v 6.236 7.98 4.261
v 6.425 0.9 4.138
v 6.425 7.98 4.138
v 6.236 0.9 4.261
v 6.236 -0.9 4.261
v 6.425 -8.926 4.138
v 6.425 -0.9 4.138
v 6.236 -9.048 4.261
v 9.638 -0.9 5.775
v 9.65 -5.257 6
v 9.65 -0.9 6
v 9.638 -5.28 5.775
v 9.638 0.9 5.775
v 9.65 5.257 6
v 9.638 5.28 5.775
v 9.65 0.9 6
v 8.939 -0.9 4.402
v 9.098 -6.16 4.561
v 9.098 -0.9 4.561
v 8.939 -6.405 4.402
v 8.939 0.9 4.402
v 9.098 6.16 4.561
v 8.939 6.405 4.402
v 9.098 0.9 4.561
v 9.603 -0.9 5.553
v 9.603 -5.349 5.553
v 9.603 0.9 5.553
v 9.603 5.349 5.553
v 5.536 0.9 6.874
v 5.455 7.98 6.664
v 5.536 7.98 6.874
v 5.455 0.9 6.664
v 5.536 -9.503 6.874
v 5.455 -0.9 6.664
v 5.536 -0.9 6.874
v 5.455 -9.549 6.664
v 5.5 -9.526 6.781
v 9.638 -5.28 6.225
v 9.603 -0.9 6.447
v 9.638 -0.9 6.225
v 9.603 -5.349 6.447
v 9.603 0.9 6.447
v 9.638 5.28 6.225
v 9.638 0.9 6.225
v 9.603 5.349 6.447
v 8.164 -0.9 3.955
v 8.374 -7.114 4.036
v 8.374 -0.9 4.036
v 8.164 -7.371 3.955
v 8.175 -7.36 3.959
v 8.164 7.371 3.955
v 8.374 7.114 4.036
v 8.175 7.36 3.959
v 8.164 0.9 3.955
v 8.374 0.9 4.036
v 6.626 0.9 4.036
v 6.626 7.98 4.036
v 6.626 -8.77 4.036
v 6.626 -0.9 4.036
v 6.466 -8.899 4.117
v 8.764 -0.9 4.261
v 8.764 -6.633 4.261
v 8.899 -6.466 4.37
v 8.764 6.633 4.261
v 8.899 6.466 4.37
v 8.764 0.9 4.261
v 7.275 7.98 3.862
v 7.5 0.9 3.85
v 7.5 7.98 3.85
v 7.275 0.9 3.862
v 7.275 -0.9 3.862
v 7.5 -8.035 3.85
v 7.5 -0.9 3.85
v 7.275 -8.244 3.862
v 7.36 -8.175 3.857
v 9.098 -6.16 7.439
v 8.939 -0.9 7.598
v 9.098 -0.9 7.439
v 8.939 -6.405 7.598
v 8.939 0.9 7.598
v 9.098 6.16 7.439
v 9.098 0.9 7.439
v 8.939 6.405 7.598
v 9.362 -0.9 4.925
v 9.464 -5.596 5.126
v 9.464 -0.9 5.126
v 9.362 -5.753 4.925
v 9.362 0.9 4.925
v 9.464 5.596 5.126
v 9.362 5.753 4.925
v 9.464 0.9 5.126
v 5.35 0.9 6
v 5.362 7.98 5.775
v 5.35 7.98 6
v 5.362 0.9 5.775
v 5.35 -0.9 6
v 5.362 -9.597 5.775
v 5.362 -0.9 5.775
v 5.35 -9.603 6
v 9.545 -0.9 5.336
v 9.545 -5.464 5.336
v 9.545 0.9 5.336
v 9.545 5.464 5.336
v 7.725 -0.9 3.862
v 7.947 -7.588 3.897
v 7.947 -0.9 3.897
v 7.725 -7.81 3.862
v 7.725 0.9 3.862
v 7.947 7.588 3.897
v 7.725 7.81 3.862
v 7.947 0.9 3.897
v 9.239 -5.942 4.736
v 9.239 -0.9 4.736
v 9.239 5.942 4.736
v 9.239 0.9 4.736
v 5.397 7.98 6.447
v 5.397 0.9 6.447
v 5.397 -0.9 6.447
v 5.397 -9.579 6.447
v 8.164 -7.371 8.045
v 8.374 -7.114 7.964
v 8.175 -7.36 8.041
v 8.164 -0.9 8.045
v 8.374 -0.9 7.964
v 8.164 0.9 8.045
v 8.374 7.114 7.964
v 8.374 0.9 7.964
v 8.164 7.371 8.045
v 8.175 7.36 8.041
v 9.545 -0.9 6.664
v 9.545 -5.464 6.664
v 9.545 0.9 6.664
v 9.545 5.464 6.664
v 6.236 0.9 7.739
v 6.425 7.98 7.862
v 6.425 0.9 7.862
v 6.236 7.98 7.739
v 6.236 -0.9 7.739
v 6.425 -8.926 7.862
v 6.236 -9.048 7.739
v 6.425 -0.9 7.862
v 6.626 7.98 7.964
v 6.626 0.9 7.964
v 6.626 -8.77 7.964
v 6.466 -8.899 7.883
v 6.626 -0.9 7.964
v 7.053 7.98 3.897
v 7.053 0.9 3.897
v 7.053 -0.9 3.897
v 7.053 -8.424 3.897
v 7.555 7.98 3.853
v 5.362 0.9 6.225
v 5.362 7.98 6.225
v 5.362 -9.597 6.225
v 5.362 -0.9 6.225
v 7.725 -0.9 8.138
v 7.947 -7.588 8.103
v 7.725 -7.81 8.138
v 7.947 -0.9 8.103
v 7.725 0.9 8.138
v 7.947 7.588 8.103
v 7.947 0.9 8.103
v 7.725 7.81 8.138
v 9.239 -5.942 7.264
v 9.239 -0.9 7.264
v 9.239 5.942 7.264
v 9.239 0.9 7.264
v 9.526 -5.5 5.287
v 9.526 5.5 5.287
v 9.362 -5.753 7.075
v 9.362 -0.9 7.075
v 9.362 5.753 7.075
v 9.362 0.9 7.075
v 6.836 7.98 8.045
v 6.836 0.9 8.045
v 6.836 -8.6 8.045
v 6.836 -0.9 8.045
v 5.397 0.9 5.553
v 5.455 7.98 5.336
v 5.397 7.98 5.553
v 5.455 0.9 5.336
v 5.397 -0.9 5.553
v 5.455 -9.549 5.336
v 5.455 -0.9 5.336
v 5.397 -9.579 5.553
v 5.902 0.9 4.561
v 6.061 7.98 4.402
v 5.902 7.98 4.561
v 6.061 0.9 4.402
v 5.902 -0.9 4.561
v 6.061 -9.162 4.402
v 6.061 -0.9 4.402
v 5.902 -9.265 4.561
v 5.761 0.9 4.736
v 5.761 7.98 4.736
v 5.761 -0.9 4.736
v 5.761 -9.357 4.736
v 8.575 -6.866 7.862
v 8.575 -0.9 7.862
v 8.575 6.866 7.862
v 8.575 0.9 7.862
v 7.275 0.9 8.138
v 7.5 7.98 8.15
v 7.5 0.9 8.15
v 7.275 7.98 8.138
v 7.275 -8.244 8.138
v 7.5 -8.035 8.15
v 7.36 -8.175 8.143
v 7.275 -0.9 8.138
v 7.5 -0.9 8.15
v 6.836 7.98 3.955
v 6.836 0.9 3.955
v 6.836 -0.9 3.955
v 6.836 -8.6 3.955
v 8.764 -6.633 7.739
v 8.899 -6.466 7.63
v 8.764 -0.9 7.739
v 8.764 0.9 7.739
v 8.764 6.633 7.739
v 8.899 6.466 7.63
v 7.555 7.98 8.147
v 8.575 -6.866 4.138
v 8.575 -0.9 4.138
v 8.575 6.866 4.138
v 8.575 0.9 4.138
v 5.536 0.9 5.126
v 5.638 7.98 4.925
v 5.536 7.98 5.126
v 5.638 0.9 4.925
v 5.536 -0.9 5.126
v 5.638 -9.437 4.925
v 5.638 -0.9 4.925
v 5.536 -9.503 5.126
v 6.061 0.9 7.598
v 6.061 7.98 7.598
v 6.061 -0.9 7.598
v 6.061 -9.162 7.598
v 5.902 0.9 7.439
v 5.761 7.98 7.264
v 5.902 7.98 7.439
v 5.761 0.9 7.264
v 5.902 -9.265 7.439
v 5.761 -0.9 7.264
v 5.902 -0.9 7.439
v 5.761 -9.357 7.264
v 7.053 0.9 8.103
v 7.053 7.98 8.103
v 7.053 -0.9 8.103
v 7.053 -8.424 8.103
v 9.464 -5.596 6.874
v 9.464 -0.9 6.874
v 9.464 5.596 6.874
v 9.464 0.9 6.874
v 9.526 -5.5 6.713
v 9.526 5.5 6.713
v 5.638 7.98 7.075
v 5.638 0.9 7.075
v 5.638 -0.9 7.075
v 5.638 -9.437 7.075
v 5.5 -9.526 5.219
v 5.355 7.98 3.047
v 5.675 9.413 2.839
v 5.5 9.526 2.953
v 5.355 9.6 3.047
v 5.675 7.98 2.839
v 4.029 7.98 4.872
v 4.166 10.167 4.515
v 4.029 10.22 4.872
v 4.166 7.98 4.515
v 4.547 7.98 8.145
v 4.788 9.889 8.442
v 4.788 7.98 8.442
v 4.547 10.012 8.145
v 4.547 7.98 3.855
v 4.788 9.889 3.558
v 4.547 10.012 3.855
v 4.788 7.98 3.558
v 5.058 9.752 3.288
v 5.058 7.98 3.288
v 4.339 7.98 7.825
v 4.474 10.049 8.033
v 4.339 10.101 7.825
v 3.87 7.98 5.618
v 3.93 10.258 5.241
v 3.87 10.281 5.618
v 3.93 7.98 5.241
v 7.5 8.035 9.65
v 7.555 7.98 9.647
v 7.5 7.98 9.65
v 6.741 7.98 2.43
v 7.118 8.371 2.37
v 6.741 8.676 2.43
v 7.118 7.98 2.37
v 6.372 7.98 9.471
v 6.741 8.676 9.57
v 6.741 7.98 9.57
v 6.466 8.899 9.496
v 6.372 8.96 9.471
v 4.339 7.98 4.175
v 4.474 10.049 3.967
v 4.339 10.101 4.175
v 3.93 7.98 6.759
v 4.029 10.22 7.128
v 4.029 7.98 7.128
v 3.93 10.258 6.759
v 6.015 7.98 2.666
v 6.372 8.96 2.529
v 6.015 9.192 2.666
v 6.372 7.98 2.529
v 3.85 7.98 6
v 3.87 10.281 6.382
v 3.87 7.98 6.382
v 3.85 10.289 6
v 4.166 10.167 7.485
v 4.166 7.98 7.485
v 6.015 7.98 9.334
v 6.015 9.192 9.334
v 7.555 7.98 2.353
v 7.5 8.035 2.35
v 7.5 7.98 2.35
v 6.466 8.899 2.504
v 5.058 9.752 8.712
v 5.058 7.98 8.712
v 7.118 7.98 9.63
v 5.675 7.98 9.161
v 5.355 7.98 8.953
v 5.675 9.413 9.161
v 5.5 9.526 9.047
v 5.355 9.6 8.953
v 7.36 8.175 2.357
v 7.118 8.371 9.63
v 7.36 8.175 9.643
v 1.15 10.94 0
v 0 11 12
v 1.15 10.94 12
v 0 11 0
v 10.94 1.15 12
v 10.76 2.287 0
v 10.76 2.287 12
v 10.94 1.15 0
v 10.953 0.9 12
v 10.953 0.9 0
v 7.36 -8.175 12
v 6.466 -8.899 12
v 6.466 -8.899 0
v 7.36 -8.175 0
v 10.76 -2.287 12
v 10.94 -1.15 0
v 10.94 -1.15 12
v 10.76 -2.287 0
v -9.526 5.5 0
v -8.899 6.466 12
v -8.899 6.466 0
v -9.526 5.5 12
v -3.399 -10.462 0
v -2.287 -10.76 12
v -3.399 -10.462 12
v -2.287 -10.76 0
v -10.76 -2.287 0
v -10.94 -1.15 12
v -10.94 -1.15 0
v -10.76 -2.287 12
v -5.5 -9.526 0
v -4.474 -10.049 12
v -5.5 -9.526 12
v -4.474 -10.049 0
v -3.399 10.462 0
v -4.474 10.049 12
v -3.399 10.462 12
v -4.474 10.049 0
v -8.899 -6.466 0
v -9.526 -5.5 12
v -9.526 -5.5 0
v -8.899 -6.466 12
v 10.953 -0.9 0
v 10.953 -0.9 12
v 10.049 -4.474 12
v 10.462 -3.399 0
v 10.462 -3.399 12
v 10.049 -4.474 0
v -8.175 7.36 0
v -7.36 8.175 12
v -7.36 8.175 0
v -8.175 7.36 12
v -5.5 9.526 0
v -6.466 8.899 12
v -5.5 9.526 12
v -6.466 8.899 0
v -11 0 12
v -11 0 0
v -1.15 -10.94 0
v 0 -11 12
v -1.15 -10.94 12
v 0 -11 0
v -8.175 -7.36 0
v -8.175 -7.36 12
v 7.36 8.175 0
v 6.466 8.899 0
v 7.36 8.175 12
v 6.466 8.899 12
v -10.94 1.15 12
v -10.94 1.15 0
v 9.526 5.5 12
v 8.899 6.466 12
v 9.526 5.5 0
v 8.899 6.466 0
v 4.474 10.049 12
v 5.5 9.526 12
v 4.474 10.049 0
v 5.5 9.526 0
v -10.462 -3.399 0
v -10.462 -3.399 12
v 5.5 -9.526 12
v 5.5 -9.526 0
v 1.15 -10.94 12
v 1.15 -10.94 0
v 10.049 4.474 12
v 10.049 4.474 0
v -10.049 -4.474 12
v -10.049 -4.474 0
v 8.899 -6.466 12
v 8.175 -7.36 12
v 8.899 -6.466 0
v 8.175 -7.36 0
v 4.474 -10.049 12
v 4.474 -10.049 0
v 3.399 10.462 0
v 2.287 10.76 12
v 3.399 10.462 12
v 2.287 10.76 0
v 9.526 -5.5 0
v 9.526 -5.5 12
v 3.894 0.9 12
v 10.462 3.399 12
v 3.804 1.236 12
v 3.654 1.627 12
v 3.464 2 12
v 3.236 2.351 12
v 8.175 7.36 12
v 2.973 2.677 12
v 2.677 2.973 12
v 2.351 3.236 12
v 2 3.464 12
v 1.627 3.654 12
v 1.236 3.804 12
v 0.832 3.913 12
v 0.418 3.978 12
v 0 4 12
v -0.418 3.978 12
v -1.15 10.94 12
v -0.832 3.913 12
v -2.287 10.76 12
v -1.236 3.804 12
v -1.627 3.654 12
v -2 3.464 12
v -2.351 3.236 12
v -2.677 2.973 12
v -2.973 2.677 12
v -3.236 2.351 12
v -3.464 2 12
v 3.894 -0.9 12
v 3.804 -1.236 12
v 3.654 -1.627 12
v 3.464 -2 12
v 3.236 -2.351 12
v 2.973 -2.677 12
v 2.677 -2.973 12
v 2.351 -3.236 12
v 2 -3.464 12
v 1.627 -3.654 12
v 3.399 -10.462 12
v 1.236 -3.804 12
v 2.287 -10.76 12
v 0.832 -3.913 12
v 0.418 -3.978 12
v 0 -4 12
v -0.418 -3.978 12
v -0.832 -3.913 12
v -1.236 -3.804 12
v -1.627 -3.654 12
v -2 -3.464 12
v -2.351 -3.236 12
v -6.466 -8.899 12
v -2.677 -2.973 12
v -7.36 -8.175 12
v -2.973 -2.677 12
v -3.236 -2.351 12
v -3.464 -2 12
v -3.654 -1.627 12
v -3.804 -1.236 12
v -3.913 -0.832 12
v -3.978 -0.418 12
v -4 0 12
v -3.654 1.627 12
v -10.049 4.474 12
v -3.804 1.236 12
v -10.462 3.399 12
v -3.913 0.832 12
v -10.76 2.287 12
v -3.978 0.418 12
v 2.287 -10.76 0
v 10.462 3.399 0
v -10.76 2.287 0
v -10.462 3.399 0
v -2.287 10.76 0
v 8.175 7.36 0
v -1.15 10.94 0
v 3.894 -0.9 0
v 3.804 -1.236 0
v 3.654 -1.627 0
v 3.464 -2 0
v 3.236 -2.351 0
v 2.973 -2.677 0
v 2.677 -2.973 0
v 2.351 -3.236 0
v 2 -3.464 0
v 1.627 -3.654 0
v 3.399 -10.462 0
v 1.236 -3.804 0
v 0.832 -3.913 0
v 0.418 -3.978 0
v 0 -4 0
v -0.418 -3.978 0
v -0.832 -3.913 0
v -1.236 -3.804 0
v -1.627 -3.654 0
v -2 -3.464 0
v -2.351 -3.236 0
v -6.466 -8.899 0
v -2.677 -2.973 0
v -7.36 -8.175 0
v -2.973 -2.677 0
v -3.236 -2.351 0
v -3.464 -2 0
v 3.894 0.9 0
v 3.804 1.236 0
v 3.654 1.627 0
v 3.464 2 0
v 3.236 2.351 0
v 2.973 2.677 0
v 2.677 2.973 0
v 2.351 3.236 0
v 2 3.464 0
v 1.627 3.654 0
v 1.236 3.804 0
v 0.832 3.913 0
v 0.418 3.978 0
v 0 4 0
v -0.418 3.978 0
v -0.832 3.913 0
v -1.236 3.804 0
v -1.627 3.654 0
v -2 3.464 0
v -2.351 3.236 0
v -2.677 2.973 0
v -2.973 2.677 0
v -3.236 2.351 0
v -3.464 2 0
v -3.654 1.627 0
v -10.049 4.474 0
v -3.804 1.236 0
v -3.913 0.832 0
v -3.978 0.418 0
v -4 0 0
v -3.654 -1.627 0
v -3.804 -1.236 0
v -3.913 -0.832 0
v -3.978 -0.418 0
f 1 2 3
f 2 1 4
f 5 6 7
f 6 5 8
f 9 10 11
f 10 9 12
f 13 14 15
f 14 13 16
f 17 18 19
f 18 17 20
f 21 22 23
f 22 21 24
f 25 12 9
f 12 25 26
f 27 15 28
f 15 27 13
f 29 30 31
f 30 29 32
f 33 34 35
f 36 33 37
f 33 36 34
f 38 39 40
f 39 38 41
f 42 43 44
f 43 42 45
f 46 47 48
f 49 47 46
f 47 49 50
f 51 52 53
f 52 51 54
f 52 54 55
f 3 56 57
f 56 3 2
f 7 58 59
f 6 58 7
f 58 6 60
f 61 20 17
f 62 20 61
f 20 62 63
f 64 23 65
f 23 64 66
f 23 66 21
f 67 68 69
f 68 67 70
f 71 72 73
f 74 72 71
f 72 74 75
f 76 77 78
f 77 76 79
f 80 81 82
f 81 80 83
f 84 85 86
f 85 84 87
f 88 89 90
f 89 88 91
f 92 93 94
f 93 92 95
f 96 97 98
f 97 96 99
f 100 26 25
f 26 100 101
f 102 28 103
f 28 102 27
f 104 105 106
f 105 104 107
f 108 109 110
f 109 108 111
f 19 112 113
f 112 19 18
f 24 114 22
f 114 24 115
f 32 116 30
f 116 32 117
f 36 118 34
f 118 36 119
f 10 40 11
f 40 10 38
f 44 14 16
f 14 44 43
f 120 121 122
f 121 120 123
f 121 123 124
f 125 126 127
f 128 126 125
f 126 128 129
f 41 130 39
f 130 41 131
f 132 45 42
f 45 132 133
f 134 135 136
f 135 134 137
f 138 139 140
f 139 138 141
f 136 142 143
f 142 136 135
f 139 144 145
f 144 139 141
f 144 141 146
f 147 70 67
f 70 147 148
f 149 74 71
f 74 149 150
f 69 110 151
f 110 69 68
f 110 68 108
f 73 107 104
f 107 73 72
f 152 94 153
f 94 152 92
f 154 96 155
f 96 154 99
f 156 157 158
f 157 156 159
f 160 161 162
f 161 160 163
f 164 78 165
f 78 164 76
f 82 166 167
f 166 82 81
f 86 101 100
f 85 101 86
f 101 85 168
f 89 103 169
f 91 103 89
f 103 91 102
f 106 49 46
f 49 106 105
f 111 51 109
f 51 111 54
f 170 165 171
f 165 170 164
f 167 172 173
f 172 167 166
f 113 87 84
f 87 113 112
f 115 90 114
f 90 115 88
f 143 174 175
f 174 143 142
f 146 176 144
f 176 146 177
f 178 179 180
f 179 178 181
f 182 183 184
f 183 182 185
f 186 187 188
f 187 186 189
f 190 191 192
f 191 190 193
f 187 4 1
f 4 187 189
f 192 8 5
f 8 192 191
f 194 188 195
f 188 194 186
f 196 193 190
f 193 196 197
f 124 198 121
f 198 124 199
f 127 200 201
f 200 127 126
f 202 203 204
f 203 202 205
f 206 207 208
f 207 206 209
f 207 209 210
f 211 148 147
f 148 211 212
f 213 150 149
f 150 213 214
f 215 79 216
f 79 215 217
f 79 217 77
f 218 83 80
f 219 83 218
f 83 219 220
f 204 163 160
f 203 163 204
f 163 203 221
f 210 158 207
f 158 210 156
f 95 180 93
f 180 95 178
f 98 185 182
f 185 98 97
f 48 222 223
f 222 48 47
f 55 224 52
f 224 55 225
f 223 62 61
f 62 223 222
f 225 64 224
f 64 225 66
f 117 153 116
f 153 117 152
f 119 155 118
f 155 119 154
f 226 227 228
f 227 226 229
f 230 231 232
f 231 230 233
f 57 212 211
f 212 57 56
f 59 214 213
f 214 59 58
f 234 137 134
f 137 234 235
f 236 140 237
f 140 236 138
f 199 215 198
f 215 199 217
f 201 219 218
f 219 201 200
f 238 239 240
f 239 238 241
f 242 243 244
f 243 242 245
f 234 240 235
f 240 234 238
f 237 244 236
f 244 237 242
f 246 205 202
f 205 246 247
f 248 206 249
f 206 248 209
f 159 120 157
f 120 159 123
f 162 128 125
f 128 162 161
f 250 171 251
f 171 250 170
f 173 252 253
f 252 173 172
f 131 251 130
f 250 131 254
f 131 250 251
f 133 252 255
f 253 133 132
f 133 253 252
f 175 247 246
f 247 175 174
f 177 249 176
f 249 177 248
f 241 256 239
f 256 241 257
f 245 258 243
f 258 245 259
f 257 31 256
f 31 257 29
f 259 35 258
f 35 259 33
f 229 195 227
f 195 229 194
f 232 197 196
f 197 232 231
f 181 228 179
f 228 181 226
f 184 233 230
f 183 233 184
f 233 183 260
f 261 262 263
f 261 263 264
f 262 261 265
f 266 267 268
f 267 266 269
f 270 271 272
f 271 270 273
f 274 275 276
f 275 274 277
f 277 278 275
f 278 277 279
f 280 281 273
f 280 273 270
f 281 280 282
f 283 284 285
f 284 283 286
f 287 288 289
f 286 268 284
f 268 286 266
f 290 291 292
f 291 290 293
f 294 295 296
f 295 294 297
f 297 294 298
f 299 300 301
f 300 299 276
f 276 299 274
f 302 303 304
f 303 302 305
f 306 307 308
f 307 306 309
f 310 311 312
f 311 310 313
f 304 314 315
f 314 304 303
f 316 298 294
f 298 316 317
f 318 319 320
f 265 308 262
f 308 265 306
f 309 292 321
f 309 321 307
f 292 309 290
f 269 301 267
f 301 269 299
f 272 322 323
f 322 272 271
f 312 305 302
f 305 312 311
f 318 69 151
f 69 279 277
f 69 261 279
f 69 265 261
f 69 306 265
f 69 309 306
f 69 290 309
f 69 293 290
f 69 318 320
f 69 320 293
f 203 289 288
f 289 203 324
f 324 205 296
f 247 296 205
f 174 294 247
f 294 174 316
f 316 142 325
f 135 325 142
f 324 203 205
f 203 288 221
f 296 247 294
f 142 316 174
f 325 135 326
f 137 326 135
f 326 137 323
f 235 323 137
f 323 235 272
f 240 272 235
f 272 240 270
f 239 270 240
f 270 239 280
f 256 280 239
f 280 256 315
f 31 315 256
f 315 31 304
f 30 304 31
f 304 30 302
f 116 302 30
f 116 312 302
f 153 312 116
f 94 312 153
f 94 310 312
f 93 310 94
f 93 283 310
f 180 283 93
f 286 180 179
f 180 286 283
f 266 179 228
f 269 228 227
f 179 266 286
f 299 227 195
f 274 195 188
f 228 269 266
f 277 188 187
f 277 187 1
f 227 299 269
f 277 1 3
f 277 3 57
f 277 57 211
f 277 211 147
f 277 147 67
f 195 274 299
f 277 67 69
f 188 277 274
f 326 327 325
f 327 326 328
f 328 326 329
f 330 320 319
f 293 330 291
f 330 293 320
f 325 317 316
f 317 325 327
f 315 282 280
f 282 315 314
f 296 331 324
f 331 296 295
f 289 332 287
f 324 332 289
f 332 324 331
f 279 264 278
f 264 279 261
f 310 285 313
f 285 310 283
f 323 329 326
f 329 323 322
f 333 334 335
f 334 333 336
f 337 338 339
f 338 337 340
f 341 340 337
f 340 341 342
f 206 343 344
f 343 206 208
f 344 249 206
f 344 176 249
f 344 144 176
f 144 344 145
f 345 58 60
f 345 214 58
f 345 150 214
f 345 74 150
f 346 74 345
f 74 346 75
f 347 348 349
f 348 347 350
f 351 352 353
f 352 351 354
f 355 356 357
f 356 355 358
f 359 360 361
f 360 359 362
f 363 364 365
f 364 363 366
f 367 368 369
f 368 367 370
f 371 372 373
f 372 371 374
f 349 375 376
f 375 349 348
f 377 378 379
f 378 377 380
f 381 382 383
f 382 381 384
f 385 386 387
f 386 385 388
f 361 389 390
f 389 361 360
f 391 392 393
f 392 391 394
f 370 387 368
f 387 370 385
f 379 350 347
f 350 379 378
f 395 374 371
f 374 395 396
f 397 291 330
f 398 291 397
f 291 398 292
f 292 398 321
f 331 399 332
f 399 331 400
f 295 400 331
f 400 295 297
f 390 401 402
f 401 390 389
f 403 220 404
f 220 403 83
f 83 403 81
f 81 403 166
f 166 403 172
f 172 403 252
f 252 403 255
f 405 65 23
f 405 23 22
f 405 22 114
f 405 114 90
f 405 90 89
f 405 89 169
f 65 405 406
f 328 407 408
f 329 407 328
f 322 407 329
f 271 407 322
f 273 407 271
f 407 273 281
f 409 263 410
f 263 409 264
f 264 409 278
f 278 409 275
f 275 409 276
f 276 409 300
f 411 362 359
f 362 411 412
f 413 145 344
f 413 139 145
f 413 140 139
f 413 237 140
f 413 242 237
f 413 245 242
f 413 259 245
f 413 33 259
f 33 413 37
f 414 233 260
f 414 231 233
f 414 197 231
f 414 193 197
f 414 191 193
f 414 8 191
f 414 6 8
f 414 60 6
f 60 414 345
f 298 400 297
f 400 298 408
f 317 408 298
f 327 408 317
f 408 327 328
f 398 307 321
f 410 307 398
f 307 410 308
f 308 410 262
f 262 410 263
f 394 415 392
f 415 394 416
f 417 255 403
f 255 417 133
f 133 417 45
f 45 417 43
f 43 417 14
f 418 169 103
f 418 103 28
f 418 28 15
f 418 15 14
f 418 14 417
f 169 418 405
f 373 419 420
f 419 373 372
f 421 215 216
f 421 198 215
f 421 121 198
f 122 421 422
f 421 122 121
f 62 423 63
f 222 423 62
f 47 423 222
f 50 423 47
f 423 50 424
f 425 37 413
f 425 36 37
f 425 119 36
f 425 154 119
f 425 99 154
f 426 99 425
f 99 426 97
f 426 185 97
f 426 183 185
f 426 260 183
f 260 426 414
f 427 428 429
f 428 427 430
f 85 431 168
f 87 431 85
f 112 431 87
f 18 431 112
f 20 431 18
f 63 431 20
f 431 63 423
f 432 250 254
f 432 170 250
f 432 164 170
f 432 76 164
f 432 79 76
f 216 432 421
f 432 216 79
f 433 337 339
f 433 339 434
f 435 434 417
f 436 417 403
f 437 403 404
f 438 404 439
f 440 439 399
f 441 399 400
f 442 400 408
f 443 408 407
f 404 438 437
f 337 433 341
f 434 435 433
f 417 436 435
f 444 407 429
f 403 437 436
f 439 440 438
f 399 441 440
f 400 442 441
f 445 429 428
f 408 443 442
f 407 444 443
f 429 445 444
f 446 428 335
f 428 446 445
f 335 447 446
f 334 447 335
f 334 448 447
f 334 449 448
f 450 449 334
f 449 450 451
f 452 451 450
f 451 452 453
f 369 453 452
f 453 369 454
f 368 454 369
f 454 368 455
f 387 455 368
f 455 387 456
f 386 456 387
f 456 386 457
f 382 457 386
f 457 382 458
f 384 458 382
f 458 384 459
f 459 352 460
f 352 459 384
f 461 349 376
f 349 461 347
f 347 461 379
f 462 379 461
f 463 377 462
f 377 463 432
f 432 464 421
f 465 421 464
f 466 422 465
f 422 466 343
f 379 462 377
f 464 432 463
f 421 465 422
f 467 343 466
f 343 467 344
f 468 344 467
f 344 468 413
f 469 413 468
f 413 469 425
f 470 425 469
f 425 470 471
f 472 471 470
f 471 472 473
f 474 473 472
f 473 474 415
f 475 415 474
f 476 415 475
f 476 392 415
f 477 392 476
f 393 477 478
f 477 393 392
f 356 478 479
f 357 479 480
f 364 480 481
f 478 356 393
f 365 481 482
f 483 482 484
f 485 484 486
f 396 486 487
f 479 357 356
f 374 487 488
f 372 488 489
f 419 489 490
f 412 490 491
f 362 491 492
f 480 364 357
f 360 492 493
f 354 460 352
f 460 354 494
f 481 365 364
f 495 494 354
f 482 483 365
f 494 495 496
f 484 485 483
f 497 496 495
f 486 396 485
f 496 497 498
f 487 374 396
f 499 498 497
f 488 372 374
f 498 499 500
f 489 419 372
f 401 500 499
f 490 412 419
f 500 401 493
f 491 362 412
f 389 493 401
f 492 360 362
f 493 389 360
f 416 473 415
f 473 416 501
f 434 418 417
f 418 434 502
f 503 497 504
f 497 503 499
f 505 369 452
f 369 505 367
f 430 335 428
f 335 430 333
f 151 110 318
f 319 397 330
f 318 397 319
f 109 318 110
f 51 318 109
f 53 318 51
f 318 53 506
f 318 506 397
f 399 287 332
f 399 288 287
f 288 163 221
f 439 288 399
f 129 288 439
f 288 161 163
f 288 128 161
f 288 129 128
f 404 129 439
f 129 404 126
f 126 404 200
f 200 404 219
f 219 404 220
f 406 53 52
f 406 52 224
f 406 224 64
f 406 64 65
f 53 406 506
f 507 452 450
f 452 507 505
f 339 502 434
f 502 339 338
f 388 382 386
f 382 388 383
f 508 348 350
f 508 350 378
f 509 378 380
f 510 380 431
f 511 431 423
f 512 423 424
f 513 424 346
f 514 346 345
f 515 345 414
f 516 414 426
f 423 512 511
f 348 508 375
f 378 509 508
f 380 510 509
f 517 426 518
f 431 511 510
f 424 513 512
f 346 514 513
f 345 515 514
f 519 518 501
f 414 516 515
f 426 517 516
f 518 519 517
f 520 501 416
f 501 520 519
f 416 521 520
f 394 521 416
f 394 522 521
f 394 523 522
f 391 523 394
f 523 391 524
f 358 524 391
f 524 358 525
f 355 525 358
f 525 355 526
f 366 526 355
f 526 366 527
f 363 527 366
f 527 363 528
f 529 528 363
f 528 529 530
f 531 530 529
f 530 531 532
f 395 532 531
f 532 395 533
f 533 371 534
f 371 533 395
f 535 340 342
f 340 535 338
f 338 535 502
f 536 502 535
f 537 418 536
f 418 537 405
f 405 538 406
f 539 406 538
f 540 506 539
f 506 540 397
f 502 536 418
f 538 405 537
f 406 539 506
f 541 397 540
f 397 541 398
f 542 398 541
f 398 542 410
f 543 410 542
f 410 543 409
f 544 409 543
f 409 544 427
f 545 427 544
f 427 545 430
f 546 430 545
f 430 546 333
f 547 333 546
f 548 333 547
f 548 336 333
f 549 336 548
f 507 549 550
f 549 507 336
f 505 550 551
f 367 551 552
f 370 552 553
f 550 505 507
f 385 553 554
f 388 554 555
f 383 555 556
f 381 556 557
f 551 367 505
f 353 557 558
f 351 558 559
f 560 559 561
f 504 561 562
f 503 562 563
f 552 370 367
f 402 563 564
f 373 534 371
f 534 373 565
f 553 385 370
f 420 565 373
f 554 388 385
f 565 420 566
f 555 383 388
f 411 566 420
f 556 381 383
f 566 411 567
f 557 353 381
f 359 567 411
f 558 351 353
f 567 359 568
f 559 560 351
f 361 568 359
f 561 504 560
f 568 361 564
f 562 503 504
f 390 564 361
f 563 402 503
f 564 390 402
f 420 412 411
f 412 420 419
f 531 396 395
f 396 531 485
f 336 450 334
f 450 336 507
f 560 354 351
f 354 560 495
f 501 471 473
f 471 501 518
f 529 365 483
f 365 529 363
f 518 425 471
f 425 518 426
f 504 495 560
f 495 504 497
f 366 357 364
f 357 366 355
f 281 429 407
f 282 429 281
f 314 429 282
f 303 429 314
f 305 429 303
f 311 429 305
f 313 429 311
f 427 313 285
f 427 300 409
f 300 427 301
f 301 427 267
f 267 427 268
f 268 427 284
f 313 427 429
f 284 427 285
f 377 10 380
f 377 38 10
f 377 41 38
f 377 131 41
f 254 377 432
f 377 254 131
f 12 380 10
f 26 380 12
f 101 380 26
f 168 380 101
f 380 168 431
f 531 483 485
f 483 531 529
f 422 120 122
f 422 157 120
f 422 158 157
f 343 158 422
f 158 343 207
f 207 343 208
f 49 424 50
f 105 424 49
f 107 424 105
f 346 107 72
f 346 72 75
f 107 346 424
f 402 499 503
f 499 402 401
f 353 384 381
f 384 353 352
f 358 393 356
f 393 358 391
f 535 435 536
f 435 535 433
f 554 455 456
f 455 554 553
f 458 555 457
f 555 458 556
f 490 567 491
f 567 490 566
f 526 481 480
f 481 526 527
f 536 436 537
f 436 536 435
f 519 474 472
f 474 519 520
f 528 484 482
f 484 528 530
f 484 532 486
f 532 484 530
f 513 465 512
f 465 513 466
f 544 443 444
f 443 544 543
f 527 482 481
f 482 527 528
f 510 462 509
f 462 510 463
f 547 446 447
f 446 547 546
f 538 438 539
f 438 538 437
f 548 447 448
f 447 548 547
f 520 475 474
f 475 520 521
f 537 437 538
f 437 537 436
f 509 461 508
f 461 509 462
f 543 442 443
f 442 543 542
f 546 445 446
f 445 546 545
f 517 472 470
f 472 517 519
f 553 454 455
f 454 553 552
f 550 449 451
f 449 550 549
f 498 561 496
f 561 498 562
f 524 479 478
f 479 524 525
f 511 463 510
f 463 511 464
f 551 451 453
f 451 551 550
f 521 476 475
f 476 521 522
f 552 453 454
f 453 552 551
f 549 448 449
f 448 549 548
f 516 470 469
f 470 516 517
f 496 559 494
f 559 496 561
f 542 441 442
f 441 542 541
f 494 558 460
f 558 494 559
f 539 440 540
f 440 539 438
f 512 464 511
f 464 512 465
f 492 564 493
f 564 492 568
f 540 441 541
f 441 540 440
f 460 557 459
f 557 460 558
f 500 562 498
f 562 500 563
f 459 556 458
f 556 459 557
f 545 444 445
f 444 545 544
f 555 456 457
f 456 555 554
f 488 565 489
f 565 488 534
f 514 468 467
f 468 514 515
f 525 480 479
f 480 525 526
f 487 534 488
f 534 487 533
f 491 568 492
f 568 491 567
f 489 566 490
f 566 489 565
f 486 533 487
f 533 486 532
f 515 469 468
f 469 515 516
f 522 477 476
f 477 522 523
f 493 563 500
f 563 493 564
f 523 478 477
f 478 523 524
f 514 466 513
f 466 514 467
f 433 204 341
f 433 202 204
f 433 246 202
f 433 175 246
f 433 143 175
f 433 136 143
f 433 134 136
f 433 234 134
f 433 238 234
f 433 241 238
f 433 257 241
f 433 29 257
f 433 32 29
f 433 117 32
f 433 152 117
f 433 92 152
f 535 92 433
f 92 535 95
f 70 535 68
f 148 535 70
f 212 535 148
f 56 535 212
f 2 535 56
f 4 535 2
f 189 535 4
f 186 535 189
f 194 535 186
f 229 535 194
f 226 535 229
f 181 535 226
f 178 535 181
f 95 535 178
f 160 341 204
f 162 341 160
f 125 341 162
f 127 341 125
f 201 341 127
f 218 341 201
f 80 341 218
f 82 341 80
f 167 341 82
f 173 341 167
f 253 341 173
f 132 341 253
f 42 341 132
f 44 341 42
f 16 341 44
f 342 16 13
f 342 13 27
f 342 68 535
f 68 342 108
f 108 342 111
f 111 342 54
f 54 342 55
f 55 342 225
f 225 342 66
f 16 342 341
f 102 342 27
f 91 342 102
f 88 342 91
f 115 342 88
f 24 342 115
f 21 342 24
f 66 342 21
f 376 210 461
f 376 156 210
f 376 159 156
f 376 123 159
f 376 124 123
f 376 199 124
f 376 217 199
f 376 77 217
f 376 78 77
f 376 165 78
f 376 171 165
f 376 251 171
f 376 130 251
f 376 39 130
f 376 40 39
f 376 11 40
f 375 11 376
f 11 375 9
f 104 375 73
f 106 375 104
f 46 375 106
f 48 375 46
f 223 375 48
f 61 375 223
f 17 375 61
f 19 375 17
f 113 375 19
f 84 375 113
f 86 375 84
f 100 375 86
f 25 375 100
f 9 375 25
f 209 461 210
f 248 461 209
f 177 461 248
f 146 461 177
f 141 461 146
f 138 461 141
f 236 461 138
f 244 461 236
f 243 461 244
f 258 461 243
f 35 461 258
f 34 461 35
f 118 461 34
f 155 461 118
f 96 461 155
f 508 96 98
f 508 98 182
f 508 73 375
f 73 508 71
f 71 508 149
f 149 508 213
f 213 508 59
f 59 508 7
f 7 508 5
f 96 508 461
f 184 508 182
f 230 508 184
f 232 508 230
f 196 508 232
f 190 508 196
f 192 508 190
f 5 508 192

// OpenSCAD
// Split shaft collar 8 mm: one-piece C-style split shaft collar.
$fn = 60;
eps = 0.02;
shaft_d = 8;
outer_d = 22;
width = 12;
slit_w = 1.8;
clamp_screw_d = 4.3;
head_d = 7.3;

module clamp_bore() {
    translate([outer_d / 2 - 3.5, -outer_d / 2 - eps, width / 2])
        rotate([-90, 0, 0]) cylinder(d = clamp_screw_d, h = outer_d + 2 * eps);
    translate([outer_d / 2 - 3.5, outer_d / 2 - 3 - eps, width / 2])
        rotate([-90, 0, 0]) cylinder(d = head_d, h = 3 + 2 * eps);
}

difference() {
    cylinder(d = outer_d, h = width);
    translate([0, 0, -eps]) cylinder(d = shaft_d, h = width + 2 * eps);
    translate([0, -slit_w / 2, -eps]) cube([outer_d / 2 + eps, slit_w, width + 2 * eps]);
    clamp_bore();
}
